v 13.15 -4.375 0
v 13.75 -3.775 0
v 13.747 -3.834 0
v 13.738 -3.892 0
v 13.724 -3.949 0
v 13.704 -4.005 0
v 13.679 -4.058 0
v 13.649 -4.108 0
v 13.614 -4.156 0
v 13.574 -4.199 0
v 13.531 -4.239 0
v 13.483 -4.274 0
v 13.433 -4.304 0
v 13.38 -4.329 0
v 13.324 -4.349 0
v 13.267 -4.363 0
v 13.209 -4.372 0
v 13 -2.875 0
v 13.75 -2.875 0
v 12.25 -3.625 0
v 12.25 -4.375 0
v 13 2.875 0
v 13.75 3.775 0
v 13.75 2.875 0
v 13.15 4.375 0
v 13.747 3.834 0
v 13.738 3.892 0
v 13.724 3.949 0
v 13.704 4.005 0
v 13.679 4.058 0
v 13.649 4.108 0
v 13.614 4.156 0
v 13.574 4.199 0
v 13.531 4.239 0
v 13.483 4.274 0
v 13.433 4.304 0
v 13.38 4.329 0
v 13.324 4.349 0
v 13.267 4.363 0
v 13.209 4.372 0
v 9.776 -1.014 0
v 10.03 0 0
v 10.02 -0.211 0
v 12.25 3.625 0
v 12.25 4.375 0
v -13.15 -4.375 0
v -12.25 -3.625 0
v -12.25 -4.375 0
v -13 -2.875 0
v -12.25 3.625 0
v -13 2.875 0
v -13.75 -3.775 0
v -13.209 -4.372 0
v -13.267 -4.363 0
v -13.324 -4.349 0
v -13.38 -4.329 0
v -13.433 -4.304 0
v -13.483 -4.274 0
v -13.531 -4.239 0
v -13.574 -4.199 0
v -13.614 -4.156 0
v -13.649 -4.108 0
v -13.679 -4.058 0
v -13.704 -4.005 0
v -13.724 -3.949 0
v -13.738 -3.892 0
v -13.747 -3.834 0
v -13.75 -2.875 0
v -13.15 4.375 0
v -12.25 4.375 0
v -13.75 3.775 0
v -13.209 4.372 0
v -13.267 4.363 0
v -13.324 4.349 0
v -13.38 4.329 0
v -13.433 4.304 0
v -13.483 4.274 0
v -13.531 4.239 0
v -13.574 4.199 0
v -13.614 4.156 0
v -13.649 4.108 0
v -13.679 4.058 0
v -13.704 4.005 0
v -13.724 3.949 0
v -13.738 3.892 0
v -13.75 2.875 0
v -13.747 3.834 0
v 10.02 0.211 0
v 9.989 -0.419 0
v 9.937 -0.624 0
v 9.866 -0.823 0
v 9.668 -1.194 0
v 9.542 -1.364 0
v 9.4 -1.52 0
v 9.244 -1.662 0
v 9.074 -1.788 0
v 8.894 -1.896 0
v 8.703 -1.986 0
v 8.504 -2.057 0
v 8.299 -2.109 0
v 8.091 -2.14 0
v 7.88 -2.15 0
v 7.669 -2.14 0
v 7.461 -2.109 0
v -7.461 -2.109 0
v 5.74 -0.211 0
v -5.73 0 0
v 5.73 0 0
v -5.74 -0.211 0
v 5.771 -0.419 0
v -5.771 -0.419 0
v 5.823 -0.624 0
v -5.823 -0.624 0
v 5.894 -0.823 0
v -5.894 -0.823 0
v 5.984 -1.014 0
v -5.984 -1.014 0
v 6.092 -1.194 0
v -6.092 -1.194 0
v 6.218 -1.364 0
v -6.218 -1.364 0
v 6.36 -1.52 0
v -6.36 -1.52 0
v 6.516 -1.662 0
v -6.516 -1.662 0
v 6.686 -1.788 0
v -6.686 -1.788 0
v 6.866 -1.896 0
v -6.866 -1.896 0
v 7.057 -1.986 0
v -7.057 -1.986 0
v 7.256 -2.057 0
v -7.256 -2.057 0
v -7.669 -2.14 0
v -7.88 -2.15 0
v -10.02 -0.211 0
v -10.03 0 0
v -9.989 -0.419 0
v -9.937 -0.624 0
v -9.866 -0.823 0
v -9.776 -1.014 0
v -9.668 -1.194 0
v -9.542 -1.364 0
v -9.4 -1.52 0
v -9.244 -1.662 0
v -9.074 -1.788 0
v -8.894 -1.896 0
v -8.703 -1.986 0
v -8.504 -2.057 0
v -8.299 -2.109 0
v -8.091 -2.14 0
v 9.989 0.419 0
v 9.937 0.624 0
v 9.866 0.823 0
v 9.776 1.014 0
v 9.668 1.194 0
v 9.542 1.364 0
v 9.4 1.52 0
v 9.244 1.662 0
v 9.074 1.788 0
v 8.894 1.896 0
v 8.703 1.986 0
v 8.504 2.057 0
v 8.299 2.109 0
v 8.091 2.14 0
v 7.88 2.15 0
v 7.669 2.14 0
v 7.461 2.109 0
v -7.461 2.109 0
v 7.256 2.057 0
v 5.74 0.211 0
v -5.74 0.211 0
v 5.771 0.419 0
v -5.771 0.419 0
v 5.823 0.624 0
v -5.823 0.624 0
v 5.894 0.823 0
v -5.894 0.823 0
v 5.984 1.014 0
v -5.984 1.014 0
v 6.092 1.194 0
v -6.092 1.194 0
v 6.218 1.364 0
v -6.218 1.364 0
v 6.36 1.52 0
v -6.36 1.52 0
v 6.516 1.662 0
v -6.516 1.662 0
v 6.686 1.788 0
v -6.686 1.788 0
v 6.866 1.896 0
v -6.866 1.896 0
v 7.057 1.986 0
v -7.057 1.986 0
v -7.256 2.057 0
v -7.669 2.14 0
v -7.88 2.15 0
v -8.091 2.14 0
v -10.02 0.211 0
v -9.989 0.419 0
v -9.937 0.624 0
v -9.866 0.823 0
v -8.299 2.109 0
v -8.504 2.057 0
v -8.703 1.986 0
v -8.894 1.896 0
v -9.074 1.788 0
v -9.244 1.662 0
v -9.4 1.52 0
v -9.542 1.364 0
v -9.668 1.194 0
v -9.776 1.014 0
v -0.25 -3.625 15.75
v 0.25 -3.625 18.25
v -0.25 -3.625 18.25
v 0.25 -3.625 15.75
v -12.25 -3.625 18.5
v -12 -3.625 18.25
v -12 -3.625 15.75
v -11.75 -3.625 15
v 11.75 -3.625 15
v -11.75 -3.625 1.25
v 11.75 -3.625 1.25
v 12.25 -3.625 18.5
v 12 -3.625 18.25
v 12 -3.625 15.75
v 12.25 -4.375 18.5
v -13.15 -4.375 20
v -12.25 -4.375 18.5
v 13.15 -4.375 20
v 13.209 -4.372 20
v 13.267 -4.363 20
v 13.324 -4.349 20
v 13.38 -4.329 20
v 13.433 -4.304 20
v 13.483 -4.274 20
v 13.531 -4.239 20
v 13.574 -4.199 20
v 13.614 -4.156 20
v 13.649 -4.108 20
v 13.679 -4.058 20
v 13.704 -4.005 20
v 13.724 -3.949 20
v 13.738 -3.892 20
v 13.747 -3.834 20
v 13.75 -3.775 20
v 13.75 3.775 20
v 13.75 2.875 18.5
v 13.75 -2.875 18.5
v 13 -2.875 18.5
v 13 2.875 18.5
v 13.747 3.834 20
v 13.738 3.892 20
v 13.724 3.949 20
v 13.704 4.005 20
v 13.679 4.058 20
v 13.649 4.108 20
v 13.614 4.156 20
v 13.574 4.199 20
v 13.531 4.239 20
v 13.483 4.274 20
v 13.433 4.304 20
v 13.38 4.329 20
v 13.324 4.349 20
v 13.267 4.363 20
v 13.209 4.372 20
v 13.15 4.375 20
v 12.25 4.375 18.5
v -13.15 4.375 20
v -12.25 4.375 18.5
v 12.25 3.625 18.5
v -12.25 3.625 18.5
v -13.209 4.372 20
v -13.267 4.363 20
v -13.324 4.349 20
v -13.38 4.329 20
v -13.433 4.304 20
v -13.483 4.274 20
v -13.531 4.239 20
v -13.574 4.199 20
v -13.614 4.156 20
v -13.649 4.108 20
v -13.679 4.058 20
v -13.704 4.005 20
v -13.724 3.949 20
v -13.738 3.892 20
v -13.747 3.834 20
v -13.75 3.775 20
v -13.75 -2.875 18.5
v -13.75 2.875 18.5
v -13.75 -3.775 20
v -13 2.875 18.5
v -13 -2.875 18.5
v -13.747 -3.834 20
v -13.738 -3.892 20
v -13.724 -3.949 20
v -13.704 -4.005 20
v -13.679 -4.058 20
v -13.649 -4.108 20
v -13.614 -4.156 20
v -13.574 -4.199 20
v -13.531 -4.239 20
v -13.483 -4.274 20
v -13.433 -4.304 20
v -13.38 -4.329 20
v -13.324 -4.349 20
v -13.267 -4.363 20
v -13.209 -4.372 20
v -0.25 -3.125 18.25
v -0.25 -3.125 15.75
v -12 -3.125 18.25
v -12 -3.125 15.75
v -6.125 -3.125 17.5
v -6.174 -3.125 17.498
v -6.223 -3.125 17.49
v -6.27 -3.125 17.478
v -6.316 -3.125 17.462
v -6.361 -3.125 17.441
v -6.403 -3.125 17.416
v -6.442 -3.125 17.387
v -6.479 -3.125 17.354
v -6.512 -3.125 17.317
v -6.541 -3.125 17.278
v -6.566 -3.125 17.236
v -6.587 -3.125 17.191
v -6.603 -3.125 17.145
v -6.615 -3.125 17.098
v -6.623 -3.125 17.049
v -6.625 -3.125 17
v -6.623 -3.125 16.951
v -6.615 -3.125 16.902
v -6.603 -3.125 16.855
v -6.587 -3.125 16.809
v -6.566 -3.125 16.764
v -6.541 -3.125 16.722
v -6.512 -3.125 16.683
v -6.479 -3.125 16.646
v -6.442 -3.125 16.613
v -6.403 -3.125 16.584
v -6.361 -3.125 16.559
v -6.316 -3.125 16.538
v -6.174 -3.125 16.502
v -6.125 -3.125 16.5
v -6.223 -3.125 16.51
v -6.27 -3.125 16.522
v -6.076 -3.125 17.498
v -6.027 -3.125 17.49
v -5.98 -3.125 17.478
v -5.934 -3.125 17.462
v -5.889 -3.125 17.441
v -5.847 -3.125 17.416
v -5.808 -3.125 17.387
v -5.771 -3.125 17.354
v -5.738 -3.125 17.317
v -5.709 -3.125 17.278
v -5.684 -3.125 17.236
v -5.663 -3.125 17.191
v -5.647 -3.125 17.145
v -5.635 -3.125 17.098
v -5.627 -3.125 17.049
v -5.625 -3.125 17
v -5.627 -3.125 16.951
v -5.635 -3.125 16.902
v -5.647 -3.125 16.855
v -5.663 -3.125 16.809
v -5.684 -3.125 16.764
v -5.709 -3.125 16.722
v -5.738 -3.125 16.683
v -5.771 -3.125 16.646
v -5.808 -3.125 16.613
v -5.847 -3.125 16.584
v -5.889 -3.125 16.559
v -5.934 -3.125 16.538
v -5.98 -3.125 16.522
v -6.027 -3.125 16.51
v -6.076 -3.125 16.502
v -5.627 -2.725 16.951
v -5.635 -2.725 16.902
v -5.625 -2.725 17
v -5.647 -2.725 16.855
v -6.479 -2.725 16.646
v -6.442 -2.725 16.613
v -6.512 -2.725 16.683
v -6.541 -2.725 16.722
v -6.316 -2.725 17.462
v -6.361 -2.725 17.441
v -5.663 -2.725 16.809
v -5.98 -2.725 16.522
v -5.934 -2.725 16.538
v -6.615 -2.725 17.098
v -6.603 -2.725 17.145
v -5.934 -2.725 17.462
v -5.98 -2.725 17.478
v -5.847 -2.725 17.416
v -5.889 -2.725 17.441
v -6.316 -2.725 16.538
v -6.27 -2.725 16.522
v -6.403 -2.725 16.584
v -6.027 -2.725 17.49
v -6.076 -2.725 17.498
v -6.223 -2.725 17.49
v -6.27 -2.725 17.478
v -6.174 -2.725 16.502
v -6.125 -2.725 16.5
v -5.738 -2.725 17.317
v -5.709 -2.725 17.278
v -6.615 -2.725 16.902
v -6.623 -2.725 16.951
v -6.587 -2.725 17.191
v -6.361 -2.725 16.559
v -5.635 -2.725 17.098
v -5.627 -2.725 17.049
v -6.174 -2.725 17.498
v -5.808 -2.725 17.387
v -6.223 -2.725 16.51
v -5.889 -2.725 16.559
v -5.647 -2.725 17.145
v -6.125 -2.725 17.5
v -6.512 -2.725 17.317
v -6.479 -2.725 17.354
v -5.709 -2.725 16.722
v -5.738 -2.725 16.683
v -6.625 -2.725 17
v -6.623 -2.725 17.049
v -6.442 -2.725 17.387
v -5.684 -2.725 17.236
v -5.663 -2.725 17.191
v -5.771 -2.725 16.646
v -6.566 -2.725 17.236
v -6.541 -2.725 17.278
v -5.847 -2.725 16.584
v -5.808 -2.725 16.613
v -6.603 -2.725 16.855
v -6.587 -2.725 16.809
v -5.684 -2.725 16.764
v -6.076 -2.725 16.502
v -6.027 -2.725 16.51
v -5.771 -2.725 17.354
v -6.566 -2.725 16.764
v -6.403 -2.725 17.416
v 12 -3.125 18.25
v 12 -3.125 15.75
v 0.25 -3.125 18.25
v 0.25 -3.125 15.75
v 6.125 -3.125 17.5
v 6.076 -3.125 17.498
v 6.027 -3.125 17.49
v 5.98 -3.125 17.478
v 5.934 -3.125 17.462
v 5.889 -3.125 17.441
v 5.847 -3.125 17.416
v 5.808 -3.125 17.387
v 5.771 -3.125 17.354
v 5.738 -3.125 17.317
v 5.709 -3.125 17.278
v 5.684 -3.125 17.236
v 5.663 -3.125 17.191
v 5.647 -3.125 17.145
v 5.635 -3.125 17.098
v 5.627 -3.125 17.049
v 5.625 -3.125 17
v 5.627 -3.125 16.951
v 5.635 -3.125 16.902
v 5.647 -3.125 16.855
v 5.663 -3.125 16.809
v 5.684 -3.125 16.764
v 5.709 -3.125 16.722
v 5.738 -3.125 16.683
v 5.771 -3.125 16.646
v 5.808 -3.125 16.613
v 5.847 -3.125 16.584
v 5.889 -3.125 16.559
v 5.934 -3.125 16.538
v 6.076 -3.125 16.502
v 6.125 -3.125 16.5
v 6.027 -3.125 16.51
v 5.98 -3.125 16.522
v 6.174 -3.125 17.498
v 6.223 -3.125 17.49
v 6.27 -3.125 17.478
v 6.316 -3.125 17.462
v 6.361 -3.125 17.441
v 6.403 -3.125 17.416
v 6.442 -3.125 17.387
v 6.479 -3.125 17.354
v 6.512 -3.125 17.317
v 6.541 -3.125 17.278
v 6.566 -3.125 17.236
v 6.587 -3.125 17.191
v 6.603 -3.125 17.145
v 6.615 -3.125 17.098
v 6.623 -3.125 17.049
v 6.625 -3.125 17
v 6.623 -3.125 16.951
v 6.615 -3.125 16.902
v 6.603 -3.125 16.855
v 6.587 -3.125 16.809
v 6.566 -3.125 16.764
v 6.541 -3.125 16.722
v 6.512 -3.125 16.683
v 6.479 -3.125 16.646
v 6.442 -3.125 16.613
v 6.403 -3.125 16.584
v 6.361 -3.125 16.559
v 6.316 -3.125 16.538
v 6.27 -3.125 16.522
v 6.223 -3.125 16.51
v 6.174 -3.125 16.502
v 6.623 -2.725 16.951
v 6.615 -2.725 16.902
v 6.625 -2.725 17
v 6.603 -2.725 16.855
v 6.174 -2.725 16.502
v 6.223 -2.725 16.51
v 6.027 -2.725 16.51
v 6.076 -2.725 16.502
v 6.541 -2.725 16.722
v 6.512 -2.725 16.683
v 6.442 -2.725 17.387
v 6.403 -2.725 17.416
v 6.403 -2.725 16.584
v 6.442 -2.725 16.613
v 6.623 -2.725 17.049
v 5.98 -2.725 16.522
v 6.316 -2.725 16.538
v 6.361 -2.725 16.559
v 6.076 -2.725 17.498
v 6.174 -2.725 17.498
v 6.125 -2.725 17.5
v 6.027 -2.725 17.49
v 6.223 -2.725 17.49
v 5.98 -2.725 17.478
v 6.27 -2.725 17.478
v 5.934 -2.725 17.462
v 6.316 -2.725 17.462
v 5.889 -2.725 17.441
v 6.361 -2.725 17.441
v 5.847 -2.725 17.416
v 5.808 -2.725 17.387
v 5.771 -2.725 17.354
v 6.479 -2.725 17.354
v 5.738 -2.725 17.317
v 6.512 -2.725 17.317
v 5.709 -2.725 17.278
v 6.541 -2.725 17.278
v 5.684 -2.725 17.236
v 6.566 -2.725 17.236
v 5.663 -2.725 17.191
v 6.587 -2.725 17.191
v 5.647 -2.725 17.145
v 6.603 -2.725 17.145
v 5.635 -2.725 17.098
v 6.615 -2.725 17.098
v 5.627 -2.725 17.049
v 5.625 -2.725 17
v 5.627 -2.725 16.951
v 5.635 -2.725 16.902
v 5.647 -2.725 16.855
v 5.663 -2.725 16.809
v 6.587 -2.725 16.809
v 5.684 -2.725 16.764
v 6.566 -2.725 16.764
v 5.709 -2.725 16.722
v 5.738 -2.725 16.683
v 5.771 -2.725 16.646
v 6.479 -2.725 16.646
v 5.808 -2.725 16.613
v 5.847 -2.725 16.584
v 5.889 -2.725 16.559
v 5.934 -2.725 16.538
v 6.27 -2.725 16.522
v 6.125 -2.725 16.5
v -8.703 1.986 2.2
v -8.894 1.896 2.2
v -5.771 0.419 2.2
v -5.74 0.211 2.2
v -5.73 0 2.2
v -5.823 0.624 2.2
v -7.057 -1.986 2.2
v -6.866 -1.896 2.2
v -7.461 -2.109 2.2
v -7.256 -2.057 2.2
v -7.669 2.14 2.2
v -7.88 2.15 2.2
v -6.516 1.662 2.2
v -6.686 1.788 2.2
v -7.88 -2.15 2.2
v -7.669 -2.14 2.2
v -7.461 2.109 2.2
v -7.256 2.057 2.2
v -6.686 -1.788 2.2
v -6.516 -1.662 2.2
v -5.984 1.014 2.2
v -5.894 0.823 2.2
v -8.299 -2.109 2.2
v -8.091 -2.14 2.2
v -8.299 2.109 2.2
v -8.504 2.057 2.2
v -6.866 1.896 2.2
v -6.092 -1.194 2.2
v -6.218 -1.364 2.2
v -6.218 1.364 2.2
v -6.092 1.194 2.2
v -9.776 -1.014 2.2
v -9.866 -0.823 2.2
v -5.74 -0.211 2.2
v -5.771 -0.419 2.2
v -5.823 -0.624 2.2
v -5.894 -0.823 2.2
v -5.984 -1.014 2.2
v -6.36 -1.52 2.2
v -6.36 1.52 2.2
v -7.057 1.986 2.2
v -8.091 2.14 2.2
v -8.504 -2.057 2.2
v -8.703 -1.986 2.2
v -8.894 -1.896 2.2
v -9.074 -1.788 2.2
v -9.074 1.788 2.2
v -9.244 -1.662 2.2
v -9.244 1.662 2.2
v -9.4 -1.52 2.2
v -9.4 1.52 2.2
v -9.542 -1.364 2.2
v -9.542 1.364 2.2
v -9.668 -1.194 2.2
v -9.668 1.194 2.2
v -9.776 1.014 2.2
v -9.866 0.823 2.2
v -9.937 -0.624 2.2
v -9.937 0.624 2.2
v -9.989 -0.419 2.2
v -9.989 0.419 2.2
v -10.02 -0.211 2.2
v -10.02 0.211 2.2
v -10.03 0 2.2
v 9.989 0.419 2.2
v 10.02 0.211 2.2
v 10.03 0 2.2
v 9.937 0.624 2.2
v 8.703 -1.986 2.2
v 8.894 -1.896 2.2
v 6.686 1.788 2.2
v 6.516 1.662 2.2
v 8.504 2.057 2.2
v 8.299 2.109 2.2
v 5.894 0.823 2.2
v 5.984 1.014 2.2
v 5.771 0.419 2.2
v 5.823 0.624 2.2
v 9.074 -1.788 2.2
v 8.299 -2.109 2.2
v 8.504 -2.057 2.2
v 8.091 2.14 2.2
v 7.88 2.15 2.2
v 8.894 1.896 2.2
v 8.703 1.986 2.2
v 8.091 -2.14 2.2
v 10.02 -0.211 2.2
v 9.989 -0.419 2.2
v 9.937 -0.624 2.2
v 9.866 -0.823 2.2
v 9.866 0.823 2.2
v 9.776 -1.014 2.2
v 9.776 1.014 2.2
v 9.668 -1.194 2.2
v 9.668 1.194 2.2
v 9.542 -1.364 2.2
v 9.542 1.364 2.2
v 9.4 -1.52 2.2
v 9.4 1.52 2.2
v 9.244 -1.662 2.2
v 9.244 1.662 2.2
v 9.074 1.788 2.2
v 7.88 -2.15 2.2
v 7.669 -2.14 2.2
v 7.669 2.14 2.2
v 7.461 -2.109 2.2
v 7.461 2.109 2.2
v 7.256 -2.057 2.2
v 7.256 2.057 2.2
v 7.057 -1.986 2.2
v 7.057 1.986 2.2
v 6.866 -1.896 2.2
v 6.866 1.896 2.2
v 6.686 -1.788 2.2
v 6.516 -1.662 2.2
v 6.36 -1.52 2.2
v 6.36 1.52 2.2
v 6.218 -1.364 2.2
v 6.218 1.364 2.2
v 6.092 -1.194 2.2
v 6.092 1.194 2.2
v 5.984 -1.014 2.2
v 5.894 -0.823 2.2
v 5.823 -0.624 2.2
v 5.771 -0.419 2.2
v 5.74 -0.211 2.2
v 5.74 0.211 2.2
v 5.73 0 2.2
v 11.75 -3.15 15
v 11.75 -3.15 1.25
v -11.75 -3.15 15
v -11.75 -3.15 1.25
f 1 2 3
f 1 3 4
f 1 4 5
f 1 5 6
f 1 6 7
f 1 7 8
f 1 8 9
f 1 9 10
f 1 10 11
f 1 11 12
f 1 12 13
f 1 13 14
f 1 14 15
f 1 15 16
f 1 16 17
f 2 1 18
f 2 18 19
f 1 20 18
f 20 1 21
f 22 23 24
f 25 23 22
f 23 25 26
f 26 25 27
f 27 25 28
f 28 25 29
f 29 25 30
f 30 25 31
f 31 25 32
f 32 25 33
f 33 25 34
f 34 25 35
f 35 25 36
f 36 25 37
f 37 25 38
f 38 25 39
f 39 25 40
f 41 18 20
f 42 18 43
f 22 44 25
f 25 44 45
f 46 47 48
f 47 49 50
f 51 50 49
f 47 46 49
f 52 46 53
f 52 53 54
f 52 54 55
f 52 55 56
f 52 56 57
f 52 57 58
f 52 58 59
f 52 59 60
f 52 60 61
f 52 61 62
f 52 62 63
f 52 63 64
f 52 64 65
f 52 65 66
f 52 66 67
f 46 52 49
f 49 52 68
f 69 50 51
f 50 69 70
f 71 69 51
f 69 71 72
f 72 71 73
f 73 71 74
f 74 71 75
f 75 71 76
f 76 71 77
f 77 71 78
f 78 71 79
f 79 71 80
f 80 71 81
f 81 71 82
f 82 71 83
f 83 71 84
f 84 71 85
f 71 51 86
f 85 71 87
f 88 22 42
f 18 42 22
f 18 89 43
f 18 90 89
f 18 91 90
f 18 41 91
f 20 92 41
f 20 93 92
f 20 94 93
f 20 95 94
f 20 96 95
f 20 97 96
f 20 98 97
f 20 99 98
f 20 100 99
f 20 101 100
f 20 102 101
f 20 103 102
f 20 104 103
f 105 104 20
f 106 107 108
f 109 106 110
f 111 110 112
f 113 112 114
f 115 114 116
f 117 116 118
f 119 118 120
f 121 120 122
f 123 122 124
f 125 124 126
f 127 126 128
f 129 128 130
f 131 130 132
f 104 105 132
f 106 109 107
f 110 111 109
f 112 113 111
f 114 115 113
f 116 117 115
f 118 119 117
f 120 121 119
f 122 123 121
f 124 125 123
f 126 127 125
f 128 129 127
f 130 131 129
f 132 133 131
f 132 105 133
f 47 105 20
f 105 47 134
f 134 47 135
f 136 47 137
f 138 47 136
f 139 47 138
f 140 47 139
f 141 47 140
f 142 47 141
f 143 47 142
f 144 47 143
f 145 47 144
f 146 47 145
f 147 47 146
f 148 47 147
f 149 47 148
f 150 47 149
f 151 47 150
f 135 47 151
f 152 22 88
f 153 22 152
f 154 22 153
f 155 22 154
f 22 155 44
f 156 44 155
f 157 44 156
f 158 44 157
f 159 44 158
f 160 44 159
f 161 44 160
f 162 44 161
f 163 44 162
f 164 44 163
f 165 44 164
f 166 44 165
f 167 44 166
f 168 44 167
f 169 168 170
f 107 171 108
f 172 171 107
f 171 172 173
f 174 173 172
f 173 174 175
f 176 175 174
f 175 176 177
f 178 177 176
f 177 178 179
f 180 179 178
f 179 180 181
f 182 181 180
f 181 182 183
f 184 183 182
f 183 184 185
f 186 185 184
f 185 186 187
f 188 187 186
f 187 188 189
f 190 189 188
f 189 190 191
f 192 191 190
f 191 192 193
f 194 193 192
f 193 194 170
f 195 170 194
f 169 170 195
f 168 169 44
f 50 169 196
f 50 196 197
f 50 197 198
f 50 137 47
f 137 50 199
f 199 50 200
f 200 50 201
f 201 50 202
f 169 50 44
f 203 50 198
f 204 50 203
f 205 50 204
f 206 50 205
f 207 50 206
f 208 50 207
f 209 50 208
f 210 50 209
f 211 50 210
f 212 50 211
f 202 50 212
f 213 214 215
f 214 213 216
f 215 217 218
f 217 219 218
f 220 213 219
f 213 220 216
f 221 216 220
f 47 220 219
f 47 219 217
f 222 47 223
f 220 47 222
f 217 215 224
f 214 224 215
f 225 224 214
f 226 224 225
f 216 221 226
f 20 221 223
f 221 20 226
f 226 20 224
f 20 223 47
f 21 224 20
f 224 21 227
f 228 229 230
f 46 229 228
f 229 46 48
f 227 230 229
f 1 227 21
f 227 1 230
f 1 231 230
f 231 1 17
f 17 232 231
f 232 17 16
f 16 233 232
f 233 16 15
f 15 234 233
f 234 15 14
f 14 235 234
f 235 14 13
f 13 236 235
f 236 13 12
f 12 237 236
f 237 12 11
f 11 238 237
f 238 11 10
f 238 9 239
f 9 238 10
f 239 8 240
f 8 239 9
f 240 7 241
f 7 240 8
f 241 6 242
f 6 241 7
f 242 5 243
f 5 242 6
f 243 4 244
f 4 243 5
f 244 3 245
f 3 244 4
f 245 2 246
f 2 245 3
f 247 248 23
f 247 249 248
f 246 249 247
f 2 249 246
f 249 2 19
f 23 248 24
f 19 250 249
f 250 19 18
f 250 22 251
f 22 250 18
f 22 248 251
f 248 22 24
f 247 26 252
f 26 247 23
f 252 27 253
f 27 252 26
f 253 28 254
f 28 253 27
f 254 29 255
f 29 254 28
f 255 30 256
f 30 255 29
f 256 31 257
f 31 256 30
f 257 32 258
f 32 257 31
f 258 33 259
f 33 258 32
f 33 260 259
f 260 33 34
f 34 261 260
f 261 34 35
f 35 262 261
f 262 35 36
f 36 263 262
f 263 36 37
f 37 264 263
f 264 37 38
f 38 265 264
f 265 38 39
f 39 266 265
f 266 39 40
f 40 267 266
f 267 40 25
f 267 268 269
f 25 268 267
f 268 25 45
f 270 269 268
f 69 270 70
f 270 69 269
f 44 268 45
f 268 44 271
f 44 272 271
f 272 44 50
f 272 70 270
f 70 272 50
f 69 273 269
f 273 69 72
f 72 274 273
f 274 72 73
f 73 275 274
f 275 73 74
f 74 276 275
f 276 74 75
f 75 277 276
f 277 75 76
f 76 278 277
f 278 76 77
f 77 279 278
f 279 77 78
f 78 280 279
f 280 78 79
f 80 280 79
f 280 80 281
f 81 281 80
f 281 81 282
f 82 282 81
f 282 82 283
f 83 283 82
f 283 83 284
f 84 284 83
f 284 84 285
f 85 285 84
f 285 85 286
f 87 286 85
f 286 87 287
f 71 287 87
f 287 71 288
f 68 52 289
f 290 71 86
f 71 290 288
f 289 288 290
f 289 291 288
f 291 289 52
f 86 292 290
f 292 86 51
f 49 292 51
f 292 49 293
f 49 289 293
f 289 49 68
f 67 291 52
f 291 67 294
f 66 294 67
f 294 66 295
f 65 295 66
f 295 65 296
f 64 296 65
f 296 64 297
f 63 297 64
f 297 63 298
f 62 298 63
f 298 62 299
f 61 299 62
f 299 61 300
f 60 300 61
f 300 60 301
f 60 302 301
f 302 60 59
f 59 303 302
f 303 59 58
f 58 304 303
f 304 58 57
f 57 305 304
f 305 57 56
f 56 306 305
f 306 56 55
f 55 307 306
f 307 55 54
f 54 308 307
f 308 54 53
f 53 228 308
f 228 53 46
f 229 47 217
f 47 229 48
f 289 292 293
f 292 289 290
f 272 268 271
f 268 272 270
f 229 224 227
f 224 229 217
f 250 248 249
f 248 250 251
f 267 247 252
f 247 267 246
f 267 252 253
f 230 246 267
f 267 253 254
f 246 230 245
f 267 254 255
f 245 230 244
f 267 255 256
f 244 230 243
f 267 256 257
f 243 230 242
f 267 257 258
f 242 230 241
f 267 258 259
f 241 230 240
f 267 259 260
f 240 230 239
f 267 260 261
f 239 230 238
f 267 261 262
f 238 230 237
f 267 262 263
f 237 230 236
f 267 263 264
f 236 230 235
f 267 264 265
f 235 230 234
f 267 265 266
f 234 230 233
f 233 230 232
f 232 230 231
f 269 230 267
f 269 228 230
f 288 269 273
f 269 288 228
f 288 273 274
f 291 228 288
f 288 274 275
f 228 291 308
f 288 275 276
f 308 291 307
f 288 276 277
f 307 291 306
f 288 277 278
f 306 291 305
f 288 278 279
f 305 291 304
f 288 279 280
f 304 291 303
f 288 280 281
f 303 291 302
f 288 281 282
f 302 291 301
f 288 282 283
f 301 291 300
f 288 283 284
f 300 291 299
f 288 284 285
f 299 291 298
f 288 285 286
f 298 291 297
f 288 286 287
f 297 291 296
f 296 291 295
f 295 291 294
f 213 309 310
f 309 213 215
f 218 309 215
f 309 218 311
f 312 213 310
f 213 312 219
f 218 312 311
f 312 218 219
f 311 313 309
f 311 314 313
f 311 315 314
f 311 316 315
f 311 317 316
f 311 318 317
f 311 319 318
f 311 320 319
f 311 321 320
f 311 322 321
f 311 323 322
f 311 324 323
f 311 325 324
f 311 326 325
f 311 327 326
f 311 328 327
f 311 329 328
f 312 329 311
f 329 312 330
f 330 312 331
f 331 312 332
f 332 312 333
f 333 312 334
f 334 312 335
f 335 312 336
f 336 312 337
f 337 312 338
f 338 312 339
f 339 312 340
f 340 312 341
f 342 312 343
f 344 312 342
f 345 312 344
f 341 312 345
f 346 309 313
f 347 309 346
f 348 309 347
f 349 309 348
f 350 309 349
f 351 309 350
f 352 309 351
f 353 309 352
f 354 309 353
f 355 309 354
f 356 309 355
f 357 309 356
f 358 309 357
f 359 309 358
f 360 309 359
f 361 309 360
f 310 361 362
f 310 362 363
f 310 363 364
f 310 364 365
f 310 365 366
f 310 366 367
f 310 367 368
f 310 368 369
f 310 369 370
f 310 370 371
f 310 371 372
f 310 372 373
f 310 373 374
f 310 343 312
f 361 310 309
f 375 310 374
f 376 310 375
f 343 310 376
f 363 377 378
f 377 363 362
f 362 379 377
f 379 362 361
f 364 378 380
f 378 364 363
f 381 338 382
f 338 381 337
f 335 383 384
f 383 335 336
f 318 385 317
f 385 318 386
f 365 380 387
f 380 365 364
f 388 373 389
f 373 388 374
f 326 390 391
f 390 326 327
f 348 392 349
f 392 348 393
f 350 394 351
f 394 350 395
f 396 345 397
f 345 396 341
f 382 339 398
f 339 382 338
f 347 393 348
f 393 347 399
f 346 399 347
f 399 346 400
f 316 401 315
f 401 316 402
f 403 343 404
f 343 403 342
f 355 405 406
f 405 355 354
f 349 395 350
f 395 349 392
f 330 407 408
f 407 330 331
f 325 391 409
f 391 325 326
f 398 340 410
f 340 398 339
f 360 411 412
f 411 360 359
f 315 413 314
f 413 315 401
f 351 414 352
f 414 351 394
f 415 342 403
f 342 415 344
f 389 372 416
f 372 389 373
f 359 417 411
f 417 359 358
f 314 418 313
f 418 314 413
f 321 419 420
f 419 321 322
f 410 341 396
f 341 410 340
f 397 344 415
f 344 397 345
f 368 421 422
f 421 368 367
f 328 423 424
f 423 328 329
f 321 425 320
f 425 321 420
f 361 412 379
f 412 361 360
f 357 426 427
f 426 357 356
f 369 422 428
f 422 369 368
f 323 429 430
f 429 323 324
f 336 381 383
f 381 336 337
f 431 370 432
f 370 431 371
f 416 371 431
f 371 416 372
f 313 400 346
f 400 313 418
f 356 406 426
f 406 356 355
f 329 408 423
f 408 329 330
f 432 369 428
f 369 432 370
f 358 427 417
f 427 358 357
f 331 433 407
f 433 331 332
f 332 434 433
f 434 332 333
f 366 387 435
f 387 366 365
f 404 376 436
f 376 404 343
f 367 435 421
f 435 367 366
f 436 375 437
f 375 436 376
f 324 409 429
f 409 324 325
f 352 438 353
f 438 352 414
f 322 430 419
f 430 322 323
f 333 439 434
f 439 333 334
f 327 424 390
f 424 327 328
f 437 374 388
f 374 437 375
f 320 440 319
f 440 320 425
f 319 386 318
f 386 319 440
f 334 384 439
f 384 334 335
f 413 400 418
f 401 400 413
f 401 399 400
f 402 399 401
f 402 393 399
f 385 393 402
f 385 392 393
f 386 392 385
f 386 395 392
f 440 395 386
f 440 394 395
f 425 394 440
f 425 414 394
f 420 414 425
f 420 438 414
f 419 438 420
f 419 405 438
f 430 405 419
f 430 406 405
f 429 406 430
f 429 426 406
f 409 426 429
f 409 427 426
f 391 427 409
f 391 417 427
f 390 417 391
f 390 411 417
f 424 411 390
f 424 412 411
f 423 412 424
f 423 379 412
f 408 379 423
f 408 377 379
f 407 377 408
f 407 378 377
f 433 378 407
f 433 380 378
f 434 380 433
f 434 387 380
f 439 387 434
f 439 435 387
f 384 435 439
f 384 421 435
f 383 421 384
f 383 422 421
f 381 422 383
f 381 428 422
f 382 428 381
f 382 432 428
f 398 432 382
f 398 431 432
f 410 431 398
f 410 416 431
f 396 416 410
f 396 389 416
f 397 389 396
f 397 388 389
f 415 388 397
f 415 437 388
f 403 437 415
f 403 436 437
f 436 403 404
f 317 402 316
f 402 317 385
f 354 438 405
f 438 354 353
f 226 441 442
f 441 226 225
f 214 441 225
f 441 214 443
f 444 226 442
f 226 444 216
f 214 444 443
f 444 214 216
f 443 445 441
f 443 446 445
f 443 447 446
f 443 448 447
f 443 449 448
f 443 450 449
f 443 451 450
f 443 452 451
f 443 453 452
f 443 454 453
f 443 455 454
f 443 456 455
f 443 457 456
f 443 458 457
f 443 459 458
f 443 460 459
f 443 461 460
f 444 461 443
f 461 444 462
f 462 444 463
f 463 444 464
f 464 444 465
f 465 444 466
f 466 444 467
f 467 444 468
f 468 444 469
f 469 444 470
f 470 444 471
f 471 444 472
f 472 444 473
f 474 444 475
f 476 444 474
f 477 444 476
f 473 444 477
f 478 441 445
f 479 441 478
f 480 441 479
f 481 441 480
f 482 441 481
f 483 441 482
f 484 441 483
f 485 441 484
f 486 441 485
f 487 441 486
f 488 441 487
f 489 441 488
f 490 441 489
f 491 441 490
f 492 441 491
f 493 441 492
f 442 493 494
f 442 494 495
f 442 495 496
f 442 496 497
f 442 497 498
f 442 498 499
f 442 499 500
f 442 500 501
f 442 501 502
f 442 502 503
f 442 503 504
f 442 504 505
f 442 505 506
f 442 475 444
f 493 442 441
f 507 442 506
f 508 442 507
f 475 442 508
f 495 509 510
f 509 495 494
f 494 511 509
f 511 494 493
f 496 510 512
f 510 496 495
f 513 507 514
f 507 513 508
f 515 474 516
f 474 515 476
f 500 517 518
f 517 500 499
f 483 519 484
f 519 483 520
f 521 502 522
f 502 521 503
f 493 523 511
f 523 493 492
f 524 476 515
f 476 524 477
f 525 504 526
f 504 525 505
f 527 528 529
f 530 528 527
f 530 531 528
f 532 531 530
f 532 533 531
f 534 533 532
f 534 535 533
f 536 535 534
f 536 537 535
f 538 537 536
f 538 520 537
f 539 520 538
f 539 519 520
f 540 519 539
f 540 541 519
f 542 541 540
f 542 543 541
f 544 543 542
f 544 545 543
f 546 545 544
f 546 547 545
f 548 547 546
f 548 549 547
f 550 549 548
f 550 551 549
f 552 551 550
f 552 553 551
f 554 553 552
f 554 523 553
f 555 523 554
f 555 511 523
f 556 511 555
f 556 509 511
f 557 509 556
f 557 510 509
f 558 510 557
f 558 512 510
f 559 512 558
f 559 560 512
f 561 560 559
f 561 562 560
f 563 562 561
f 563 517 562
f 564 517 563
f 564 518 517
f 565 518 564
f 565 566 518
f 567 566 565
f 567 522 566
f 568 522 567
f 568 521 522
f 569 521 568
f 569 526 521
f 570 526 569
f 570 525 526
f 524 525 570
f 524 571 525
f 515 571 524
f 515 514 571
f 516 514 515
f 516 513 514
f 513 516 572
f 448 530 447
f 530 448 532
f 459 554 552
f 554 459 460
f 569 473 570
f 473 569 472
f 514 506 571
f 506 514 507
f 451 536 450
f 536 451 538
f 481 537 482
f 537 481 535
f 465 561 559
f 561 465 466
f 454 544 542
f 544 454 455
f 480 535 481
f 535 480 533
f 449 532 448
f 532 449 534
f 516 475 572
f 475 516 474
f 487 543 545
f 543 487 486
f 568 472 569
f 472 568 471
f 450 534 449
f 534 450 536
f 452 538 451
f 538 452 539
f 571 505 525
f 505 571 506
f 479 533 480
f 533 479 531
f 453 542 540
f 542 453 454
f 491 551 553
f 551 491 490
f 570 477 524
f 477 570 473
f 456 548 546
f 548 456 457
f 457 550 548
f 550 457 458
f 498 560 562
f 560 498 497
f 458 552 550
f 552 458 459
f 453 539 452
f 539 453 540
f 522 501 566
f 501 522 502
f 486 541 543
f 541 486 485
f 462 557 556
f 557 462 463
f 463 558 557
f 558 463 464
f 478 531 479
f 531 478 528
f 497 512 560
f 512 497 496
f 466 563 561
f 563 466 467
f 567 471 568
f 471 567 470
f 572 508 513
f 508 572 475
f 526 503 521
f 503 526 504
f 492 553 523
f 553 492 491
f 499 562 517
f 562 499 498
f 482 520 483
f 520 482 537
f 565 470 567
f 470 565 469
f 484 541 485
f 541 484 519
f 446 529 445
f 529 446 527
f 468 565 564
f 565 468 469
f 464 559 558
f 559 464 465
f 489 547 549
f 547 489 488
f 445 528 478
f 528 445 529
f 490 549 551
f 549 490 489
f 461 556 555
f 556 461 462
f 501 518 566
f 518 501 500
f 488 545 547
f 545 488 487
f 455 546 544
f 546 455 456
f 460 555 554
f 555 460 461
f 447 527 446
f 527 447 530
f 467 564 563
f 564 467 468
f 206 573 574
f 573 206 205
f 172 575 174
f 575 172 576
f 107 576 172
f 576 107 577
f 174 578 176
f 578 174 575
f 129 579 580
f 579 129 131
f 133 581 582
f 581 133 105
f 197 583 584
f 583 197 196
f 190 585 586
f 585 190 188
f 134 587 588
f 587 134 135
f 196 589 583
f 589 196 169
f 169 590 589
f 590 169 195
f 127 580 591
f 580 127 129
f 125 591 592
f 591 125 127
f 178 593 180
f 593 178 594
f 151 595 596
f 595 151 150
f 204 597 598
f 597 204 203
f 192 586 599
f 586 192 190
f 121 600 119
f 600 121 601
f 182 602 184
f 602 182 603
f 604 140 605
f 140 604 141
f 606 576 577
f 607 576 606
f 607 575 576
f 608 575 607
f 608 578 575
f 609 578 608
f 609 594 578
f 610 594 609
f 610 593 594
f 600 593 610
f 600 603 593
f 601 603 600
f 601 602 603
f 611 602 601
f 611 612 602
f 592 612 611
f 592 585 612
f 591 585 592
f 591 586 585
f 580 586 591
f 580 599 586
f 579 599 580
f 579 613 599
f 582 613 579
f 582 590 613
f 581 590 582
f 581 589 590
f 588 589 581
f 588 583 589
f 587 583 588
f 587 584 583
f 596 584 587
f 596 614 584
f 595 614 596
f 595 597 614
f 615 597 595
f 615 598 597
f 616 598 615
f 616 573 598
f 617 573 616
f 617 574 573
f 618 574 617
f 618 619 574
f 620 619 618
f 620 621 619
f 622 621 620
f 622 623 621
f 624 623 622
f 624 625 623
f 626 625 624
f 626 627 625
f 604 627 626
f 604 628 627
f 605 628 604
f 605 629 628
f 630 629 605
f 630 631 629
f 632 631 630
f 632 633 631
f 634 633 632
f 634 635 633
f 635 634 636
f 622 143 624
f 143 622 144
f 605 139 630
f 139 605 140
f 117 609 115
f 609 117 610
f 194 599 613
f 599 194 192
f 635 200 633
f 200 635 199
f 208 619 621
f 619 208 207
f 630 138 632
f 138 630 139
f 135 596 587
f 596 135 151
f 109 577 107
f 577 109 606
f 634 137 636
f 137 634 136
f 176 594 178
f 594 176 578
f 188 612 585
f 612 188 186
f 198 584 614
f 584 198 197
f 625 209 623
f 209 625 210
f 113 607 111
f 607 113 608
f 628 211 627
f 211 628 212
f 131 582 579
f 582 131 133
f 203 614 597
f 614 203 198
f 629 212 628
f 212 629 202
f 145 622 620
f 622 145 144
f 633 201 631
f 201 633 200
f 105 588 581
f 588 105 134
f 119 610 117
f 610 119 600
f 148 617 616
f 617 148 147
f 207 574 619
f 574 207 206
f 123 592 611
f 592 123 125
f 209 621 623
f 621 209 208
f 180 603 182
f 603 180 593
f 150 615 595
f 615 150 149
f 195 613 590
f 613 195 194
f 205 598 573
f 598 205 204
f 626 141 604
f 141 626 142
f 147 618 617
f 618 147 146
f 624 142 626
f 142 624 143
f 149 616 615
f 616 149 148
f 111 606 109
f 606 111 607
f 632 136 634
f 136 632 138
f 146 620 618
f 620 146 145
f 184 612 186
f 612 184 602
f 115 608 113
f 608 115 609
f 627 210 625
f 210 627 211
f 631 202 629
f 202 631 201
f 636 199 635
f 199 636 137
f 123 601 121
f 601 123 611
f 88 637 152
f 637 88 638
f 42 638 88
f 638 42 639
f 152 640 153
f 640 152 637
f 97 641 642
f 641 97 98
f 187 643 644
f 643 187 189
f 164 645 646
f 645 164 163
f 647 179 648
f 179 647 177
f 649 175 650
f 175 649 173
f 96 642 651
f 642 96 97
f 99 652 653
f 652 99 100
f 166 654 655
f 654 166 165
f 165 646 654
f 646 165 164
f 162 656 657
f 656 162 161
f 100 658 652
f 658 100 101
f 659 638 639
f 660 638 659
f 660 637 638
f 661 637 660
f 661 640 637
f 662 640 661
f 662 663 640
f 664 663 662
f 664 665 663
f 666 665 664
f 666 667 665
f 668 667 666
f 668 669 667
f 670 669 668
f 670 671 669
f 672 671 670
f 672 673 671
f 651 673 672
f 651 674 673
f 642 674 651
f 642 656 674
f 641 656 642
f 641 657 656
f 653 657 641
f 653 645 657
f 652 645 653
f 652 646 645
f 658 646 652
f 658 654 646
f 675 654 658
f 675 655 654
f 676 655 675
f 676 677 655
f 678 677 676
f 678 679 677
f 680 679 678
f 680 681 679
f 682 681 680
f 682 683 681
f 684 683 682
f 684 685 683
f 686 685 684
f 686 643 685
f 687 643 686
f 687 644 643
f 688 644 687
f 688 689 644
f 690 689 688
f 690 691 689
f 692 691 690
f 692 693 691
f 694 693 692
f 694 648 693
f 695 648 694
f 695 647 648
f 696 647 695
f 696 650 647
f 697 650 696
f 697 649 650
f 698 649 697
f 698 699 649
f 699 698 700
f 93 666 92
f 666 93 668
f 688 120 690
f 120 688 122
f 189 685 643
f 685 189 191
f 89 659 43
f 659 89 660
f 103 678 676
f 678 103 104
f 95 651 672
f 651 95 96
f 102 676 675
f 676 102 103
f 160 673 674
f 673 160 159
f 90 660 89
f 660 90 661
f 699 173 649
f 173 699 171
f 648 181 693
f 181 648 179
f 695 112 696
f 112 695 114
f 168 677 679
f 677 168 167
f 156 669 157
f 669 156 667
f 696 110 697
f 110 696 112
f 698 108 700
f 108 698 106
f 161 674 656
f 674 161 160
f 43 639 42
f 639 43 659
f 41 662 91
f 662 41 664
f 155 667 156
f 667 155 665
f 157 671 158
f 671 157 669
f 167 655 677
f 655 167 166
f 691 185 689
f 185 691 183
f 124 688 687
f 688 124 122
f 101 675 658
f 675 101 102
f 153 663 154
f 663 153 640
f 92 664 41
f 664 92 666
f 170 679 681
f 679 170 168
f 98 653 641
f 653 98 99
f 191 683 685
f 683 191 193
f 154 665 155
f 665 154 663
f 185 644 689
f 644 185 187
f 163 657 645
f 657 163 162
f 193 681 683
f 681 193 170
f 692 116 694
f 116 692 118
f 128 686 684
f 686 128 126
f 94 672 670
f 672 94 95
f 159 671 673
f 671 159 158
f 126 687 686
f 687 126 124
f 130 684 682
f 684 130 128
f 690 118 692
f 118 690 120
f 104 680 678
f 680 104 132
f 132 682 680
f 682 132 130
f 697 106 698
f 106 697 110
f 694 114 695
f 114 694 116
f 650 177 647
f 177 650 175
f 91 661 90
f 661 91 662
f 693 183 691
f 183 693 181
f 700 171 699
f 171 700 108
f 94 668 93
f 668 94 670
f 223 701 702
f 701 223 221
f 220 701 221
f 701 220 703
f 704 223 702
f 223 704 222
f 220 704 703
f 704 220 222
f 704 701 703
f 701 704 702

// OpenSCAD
// livingroom / console — a narrow hall / console table: a top slab standing proud of a
// frame-and-panel body on four corner legs (legged_block() in lib/common.scad), with one
// shallow drawer under the top and the space a console keeps under it sunk deeper still.
//
// It used to be built like the old garden table — a body set back from the edge with corner
// legs — and on a piece only 35 cm deep that came out as a brick: the set-back is clamped by
// what a magnet pocket needs across the base, and its own comment said so ("on a depth this
// shallow that second clamp wins, so by default the body barely sets back at all"). It now
// reads by its frame instead, which is what the rest of the free-standing furniture does.
//
// It is NOT the dining table's slab on four open legs, and the magnet is why: a leg wide enough
// to bury the standard 4 x 2 disc is 25 cm of real furniture at 1:40, and a console is 35 cm
// deep. The frame keeps a 29 cm rail underneath for the pockets, so the piece holds the board
// as hard as everything else — the same trade diningroom/bench.scad makes.
//
// Width/Depth are the real-world top in cm: a hall console typically runs 100-120 cm long and
// only 30-40 cm deep, pushed flat against a wall rather than sat around. Height is the real
// height of the top — a console stands at table height — shrunk by the plan scale like the
// footprint (see printed_h() in lib/common.scad). A small 40x40 side/occasional table is the
// same part at Height = 45 instead: coffee-table height rather than console height.

include <../lib/common.scad>

Width  = 110;  // cm — override to 40 (with Depth 40) for a small side-table variant
Depth  = 35;   // cm
Height = 80;   // cm — top of the slab (45 for a side/coffee table)

// the printed height, mm: Height at the plan scale
Print_h = printed_h(Height);

// The frame, in real cm: slim legs and a thin top, as a console has.
Leg      = 6;  // cm — a corner leg
Leg_rail = 3;  // cm the rail between two legs is set back behind them
Slab     = 3;  // cm of the height the top slab takes
Rail_h   = 5;  // cm of leg left clear at the floor — the bottom rail

Show_drawer = true;
// One shallow drawer under the top — a console has at most one course of them — with a knob
// rather than the kitchen's grip rail, like the rest of the free-standing furniture (see
// unit_fronts in lib/common.scad).
Drawers  = 0;   // fronts across the band (0 = one per Drawer_width cm)
Drawer_width = 55;  // cm — nominal width of one front
Drawer_h = 12;  // cm of the face the drawer band takes, measured down from the top
Knob_d   = 4;   // cm — a real drawer knob

Show_open = true;
// The space under the drawer, sunk deeper into the front than a drawer front is, so what you
// read between the legs is the open space a console keeps rather than another panel. Held clear
// of the magnet pocket behind it — see open_depth().
Open_depth = 4;  // cm
Open_gap   = 2;  // cm between the drawer band and the top of it

// Magnet pockets in the bottom face, in a row along the length (0 = none). Two keep the piece
// from pivoting on the board. They go in the rail, the broad part of the bottom face — 29 cm of
// it front to back is 7.25 mm at 1:40, wide enough for a 4 mm disc (see legged_floor_w() and
// Magnet_* in lib/common.scad). The 40x40 side table has room for only ONE, and says so in the
// render log — build that variant with Magnets=1.
Magnets = 2;

// ---- what the face is divided into ------------------------------------------
function field_w() = legged_field_w(Width, Depth, Leg, Leg_rail);
function face_d()  = legged_face_d(Width, Depth, Leg_rail);
function face_z1() = legged_face_z1(Width, Depth, Print_h, Slab, Leg_rail);
// The drawer band hangs off the top of the face; the open space fills what is left above the
// bottom rail. Both clamped into the face, so a squashed set or a side-table height cannot push
// either out through the other.
function drawer_z0() = max(rise(Rail_h), face_z1() - rise(Drawer_h));
function open_z1()   = max(rise(Rail_h), drawer_z0() - rise(Open_gap));
// How many fronts the band carries: as asked for, or one per Drawer_width cm of the field.
function drawers() = Drawers > 0 ? Drawers
                                 : max(1, round(field_w() / Drawer_width));
// How deep the open space really goes, real cm: never so deep that it breaks into the magnet
// pocket sitting on the centre line behind it (as bedroom/dressing_table.scad clamps its knee).
function open_depth() =
    Magnets > 0
        ? min(Open_depth,
              plan_cm(cm(face_d()) / 2 - magnet_pocket_d() / 2 - Magnet_inset))
        : Open_depth;

console();

module console() {
    difference() {
        legged_block(Width, Depth, Print_h, Leg, Leg_rail, Slab);
        if (Show_drawer && face_z1() - drawer_z0() > Symbol_stroke)
            unit_fronts(field_w(), Depth, drawer_z0(), face_z1(), drawers(), 1,
                        face_cm = face_d(), knob_cm = Knob_d);
        if (Show_open && open_z1() - rise(Rail_h) > Symbol_stroke && open_depth() > 0)
            front_recess(0, (rise(Rail_h) + open_z1()) / 2,
                         cm(field_w()) - 2 * cm(Front_gap), open_z1() - rise(Rail_h),
                         face_d(), cm(open_depth()));
        if (Magnets > 0)
            magnets(legged_floor_w(Width, Depth, Leg_rail),
                    legged_floor_d(Width, Depth, Leg_rail), Magnets);
    }
}
